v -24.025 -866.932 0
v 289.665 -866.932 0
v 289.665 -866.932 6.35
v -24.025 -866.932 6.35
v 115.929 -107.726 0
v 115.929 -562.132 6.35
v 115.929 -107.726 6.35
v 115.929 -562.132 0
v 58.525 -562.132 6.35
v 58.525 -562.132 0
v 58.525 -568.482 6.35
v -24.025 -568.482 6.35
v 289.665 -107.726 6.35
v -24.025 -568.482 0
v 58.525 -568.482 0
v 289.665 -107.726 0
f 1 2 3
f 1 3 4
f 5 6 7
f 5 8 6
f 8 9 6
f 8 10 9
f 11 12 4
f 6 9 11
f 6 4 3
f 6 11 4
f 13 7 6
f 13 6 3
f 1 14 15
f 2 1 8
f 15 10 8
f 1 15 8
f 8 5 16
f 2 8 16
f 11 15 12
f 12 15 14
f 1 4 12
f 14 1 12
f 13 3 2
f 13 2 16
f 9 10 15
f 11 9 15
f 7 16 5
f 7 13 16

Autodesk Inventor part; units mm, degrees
ref_plane "YZ Plane" through (0, 0, 0) normal (1, 0, 0) x (0, 1, 0)
ref_plane "XZ Plane" through (0, 0, 0) normal (0, 1, 0) x (-1, 0, 0)
ref_plane "XY Plane" through (0, 0, 0) normal (0, 0, 1) x (1, 0, 0)
sketch "Sketch1" plane through (0, 0, 0) normal (0, 0, 1) x (1, 0, 0)
  line L0 (-30.3746, 22.0684) -> (296.0154, 22.0684)
  line L1 (296.0154, 22.0684) -> (296.0154, -866.9316)
  line L2 (296.0154, -866.9316) -> (-30.3746, -866.9316)
  line L3 (-30.3746, -866.9316) -> (-30.3746, 22.0684)
  point P0 (0, 0)
  dimension "d0" = 326.39
  dimension "d1" = 889
extrude "Extrusion1" add sketch "Sketch1" along normal blind 6.35
sketch "Sketch2" plane through (0, 0, 6.35) normal (0, 0, 1) x (1, 0, 0)
  line L0 (296.0154, 22.0684) -> (296.0154, -866.9316) projected
  line L1 (296.0154, 22.0684) -> (289.6654, 22.0684)
  line L2 (289.6654, 22.0684) -> (289.6654, -28.7316)
  line L3 (289.6654, -28.7316) -> (296.0154, -28.7316)
  line L4 (296.0154, -28.7316) -> (296.0154, 22.0684)
  line L5 (289.6654, -28.7316) -> (296.0154, -28.7316)
  line L6 (296.0154, -28.7316) -> (296.0154, -79.5316)
  line L7 (296.0154, -79.5316) -> (289.6654, -79.5316)
  line L8 (289.6654, -79.5316) -> (289.6654, -28.7316)
  line L9 (289.6654, -79.5316) -> (296.0154, -79.5316)
  line L10 (296.0154, -79.5316) -> (296.0154, -130.3316)
  line L11 (296.0154, -130.3316) -> (289.6654, -130.3316)
  line L12 (289.6654, -130.3316) -> (289.6654, -79.5316)
  line L13 (289.6654, -130.3316) -> (296.0154, -130.3316)
  line L14 (296.0154, -130.3316) -> (296.0154, -181.1316)
  line L15 (296.0154, -181.1316) -> (289.6654, -181.1316)
  line L16 (289.6654, -181.1316) -> (289.6654, -130.3316)
  line L17 (289.6654, -181.1316) -> (296.0154, -181.1316)
  line L18 (296.0154, -181.1316) -> (296.0154, -231.9316)
  line L19 (296.0154, -231.9316) -> (289.6654, -231.9316)
  line L20 (289.6654, -231.9316) -> (289.6654, -181.1316)
  line L21 (289.6654, -231.9316) -> (296.0154, -231.9316)
  line L22 (296.0154, -231.9316) -> (296.0154, -282.7316)
  line L23 (296.0154, -282.7316) -> (289.6654, -282.7316)
  line L24 (289.6654, -282.7316) -> (289.6654, -231.9316)
  line L25 (289.6654, -282.7316) -> (296.0154, -282.7316)
  line L26 (296.0154, -282.7316) -> (296.0154, -333.5316)
  line L27 (296.0154, -333.5316) -> (289.6654, -333.5316)
  line L28 (289.6654, -333.5316) -> (289.6654, -282.7316)
  line L29 (289.6654, -333.5316) -> (296.0154, -333.5316)
  line L30 (296.0154, -333.5316) -> (296.0154, -384.3316)
  line L31 (296.0154, -384.3316) -> (289.6654, -384.3316)
  line L32 (289.6654, -384.3316) -> (289.6654, -333.5316)
  line L33 (289.6654, -384.3316) -> (296.0154, -384.3316)
  line L34 (296.0154, -384.3316) -> (296.0154, -435.1316)
  line L35 (296.0154, -435.1316) -> (289.6654, -435.1316)
  line L36 (289.6654, -435.1316) -> (289.6654, -384.3316)
  line L37 (289.6654, -435.1316) -> (296.0154, -435.1316)
  line L38 (296.0154, -435.1316) -> (296.0154, -485.9316)
  line L39 (296.0154, -485.9316) -> (289.6654, -485.9316)
  line L40 (289.6654, -485.9316) -> (289.6654, -435.1316)
  line L41 (289.6654, -485.9316) -> (296.0154, -485.9316)
  line L42 (296.0154, -485.9316) -> (296.0154, -536.7316)
  line L43 (296.0154, -536.7316) -> (289.6654, -536.7316)
  line L44 (289.6654, -536.7316) -> (289.6654, -485.9316)
  line L45 (289.6654, -536.7316) -> (296.0154, -536.7316)
  line L46 (296.0154, -536.7316) -> (296.0154, -587.5316)
  line L47 (296.0154, -587.5316) -> (289.6654, -587.5316)
  line L48 (289.6654, -587.5316) -> (289.6654, -536.7316)
  line L49 (289.6654, -587.5316) -> (296.0154, -587.5316)
  line L50 (296.0154, -587.5316) -> (296.0154, -638.3316)
  line L51 (296.0154, -638.3316) -> (289.6654, -638.3316)
  line L52 (289.6654, -638.3316) -> (289.6654, -587.5316)
  line L53 (289.6654, -638.3316) -> (296.0154, -638.3316)
  line L54 (296.0154, -638.3316) -> (296.0154, -689.1316)
  line L55 (296.0154, -689.1316) -> (289.6654, -689.1316)
  line L56 (289.6654, -689.1316) -> (289.6654, -638.3316)
  line L57 (289.6654, -689.1316) -> (296.0154, -689.1316)
  line L58 (296.0154, -689.1316) -> (296.0154, -739.9316)
  line L59 (296.0154, -739.9316) -> (289.6654, -739.9316)
  line L60 (289.6654, -739.9316) -> (289.6654, -689.1316)
  line L61 (289.6654, -739.9316) -> (296.0154, -739.9316)
  line L62 (296.0154, -739.9316) -> (296.0154, -790.7316)
  line L63 (296.0154, -790.7316) -> (289.6654, -790.7316)
  line L64 (289.6654, -790.7316) -> (289.6654, -739.9316)
  line L65 (289.6654, -790.7316) -> (296.0154, -790.7316)
  line L66 (296.0154, -790.7316) -> (296.0154, -841.5316)
  line L67 (296.0154, -841.5316) -> (289.6654, -841.5316)
  line L68 (289.6654, -841.5316) -> (289.6654, -790.7316)
  line L69 (289.6654, -841.5316) -> (296.0154, -841.5316)
  line L70 (296.0154, -841.5316) -> (296.0154, -866.9316)
  line L71 (296.0154, -866.9316) -> (289.6654, -866.9316)
  line L72 (289.6654, -866.9316) -> (289.6654, -841.5316)
  point P0 (0, 0)
  dimension "d4" = 6.35
  dimension "d5" = 50.8
  dimension "d6" = 50.8
  dimension "d7" = 50.8
  dimension "d8" = 50.8
  dimension "d9" = 50.8
  dimension "d10" = 50.8
  dimension "d11" = 50.8
  dimension "d12" = 50.8
  dimension "d13" = 50.8
  dimension "d14" = 50.8
  dimension "d15" = 50.8
  dimension "d16" = 50.8
  dimension "d17" = 50.8
  dimension "d18" = 50.8
  dimension "d19" = 50.8
  dimension "d20" = 50.8
  dimension "d21" = 50.8
extrude "Extrusion2" cut sketch "Sketch2" against normal blind 6.35 contours L0 L3 L2 L1 | L0 L11 L12 L7 | L0 L19 L20 L15 | L0 L27 L28 L23 | L0 L35 L36 L31 | L0 L43 L44 L39 | L0 L51 L52 L47 | L0 L59 L60 L55 | L0 L67 L68 L63 | L0 L71 L72 L67
sketch "Sketch3" plane through (0, 0, 6.35) normal (0, 0, 1) x (1, 0, 0)
  line L0 (-30.3746, -866.9316) -> (-30.3746, 22.0684) projected
  line L1 (289.6654, -866.9316) -> (-30.3746, -866.9316) projected
  line L2 (-30.3746, 22.0684) -> (-24.0246, 22.0684)
  line L3 (-24.0246, 22.0684) -> (-24.0246, -28.7316)
  line L4 (-24.0246, -28.7316) -> (-30.3746, -28.7316)
  line L5 (-30.3746, -28.7316) -> (-30.3746, 22.0684)
  line L6 (-30.3746, -28.7316) -> (-24.0246, -28.7316)
  line L7 (-24.0246, -28.7316) -> (-24.0246, -79.5316)
  line L8 (-24.0246, -79.5316) -> (-30.3746, -79.5316)
  line L9 (-30.3746, -79.5316) -> (-30.3746, -28.7316)
  line L10 (-24.0246, -79.5316) -> (-30.3746, -79.5316)
  line L11 (-30.3746, -79.5316) -> (-30.3746, -130.3316)
  line L12 (-30.3746, -130.3316) -> (-24.0246, -130.3316)
  line L13 (-24.0246, -130.3316) -> (-24.0246, -79.5316)
  line L14 (-24.0246, -130.3316) -> (-30.3746, -130.3316)
  line L15 (-30.3746, -130.3316) -> (-30.3746, -181.1316)
  line L16 (-30.3746, -181.1316) -> (-24.0246, -181.1316)
  line L17 (-24.0246, -181.1316) -> (-24.0246, -130.3316)
  line L18 (-30.3746, -181.1316) -> (-24.0246, -181.1316)
  line L19 (-24.0246, -181.1316) -> (-24.0246, -231.9316)
  line L20 (-24.0246, -231.9316) -> (-30.3746, -231.9316)
  line L21 (-30.3746, -231.9316) -> (-30.3746, -181.1316)
  line L22 (-24.0246, -231.9316) -> (-30.3746, -231.9316)
  line L23 (-30.3746, -231.9316) -> (-30.3746, -282.7316)
  line L24 (-30.3746, -282.7316) -> (-24.0246, -282.7316)
  line L25 (-24.0246, -282.7316) -> (-24.0246, -231.9316)
  line L26 (-30.3746, -282.7316) -> (-24.0246, -282.7316)
  line L27 (-24.0246, -282.7316) -> (-24.0246, -333.5316)
  line L28 (-24.0246, -333.5316) -> (-30.3746, -333.5316)
  line L29 (-30.3746, -333.5316) -> (-30.3746, -282.7316)
  line L30 (-24.0246, -333.5316) -> (-30.3746, -333.5316)
  line L31 (-30.3746, -333.5316) -> (-30.3746, -384.3316)
  line L32 (-30.3746, -384.3316) -> (-24.0246, -384.3316)
  line L33 (-24.0246, -384.3316) -> (-24.0246, -333.5316)
  line L34 (-30.3746, -384.3316) -> (-24.0246, -384.3316)
  line L35 (-24.0246, -384.3316) -> (-24.0246, -435.1316)
  line L36 (-24.0246, -435.1316) -> (-30.3746, -435.1316)
  line L37 (-30.3746, -435.1316) -> (-30.3746, -384.3316)
  line L38 (-24.0246, -435.1316) -> (-30.3746, -435.1316)
  line L39 (-30.3746, -435.1316) -> (-30.3746, -485.9316)
  line L40 (-30.3746, -485.9316) -> (-24.0246, -485.9316)
  line L41 (-24.0246, -485.9316) -> (-24.0246, -435.1316)
  line L42 (-30.3746, -485.9316) -> (-24.0246, -485.9316)
  line L43 (-24.0246, -485.9316) -> (-24.0246, -536.7316)
  line L44 (-24.0246, -536.7316) -> (-30.3746, -536.7316)
  line L45 (-30.3746, -536.7316) -> (-30.3746, -485.9316)
  line L46 (-24.0246, -536.7316) -> (-30.3746, -536.7316)
  line L47 (-30.3746, -536.7316) -> (-30.3746, -587.5316)
  line L48 (-30.3746, -587.5316) -> (-24.0246, -587.5316)
  line L49 (-24.0246, -587.5316) -> (-24.0246, -536.7316)
  line L50 (-30.3746, -587.5316) -> (-24.0246, -587.5316)
  line L51 (-24.0246, -587.5316) -> (-24.0246, -638.3316)
  line L52 (-24.0246, -638.3316) -> (-30.3746, -638.3316)
  line L53 (-30.3746, -638.3316) -> (-30.3746, -587.5316)
  line L54 (-24.0246, -638.3316) -> (-30.3746, -638.3316)
  line L55 (-30.3746, -638.3316) -> (-30.3746, -689.1316)
  line L56 (-30.3746, -689.1316) -> (-24.0246, -689.1316)
  line L57 (-24.0246, -689.1316) -> (-24.0246, -638.3316)
  line L58 (-30.3746, -689.1316) -> (-24.0246, -689.1316)
  line L59 (-24.0246, -689.1316) -> (-24.0246, -739.9316)
  line L60 (-24.0246, -739.9316) -> (-30.3746, -739.9316)
  line L61 (-30.3746, -739.9316) -> (-30.3746, -689.1316)
  line L62 (-30.3746, -739.9316) -> (-24.0246, -739.9316)
  line L63 (-24.0246, -739.9316) -> (-24.0246, -790.7316)
  line L64 (-24.0246, -790.7316) -> (-30.3746, -790.7316)
  line L65 (-30.3746, -790.7316) -> (-30.3746, -739.9316)
  line L66 (-30.3746, -790.7316) -> (-24.0246, -790.7316)
  line L67 (-24.0246, -790.7316) -> (-24.0246, -866.9316)
  line L68 (-24.0246, -866.9316) -> (-30.3746, -866.9316)
  line L69 (-30.3746, -866.9316) -> (-30.3746, -790.7316)
  point P0 (0, 0)
  dimension "d24" = 6.35
extrude "Extrusion3" cut sketch "Sketch3" against normal blind 6.35 contours L0 L64 L67 L1 | L0 L56 L59 L60 | L0 L48 L51 L52 | L0 L40 L43 L44 | L0 L32 L35 L36 | L0 L24 L27 L28 | L0 L16 L19 L20 | L0 L8 L13 L12 | L0 L2 L3 L4
sketch "Sketch4" plane through (0, 0, 6.35) normal (0, 0, 1) x (1, 0, 0)
  line L0 (-24.0246, 22.0684) -> (132.8204, 22.0684)
  line L1 (132.8204, 22.0684) -> (132.8204, 15.7184)
  line L2 (132.8204, 15.7184) -> (-24.0246, 15.7184)
  line L3 (-24.0246, 15.7184) -> (-24.0246, 22.0684)
  line L4 (132.8204, 22.0684) -> (158.2204, 22.0684)
  line L5 (158.2204, 22.0684) -> (158.2204, 15.7184)
  line L6 (158.2204, 15.7184) -> (132.8204, 15.7184)
  line L7 (132.8204, 15.7184) -> (132.8204, 22.0684)
  line L8 (158.2204, 22.0684) -> (209.0204, 22.0684)
  line L9 (209.0204, 22.0684) -> (209.0204, 15.7184)
  line L10 (209.0204, 15.7184) -> (158.2204, 15.7184)
  line L11 (158.2204, 15.7184) -> (158.2204, 22.0684)
  line L12 (209.0204, 22.0684) -> (259.8204, 22.0684)
  line L13 (259.8204, 22.0684) -> (259.8204, 15.7184)
  line L14 (259.8204, 15.7184) -> (209.0204, 15.7184)
  line L15 (209.0204, 15.7184) -> (209.0204, 22.0684)
  line L16 (132.8204, 22.0684) -> (107.4204, 22.0684)
  line L17 (107.4204, 22.0684) -> (107.4204, 15.7184)
  line L18 (107.4204, 15.7184) -> (132.8204, 15.7184)
  line L19 (132.8204, 15.7184) -> (132.8204, 22.0684)
  line L20 (107.4204, 22.0684) -> (56.6204, 22.0684)
  line L21 (56.6204, 22.0684) -> (56.6204, 15.7184)
  line L22 (56.6204, 15.7184) -> (107.4204, 15.7184)
  line L23 (107.4204, 15.7184) -> (107.4204, 22.0684)
  line L24 (56.6204, 22.0684) -> (5.8204, 22.0684)
  line L25 (5.8204, 22.0684) -> (5.8204, 15.7184)
  line L26 (5.8204, 15.7184) -> (56.6204, 15.7184)
  line L27 (56.6204, 15.7184) -> (56.6204, 22.0684)
  point P0 (0, 0)
  dimension "d27" = 156.845
  dimension "d28" = 6.35
  dimension "d29" = 25.4
  dimension "d30" = 50.8
  dimension "d31" = 50.8
  dimension "d32" = 25.4
  dimension "d33" = 50.8
  dimension "d34" = 50.8
extrude "Extrusion4" add sketch "Sketch4" along normal blind 6.35 contours L0 L21 L2 L25 | L0 L1 L2 L17 | L4 L5 L6 L1 | L12 L13 L14 L9
sketch "Sketch5" plane through (0, 0, 12.7) normal (0, 0, 1) x (1, 0, 0)
  line L0 (5.8204, 15.7184) -> (5.8204, 22.0684) projected
  line L1 (56.6204, 15.7184) -> (5.8204, 15.7184) projected
  line L2 (56.6204, 22.0684) -> (56.6204, 15.7184) projected
  line L3 (5.8204, 22.0684) -> (56.6204, 22.0684) projected
  point P0 (0, 0)
extrude "Extrusion5" cut sketch "Sketch5" against normal blind 25.4
sketch "Sketch6" plane through (0, 0, 12.7) normal (0, 0, 1) x (1, 0, 0)
  line L0 (107.4204, 22.0684) -> (158.2204, 22.0684) projected
  line L1 (107.4204, 15.7184) -> (107.4204, 22.0684) projected
  line L2 (158.2204, 15.7184) -> (107.4204, 15.7184) projected
  line L3 (158.2204, 22.0684) -> (158.2204, 15.7184) projected
  point P0 (0, 0)
extrude "Extrusion6" cut sketch "Sketch6" against normal blind 25.4
sketch "Sketch7" plane through (0, 0, 12.7) normal (0, 0, 1) x (1, 0, 0)
  line L0 (209.0204, 22.0684) -> (259.8204, 22.0684) projected
  line L1 (209.0204, 15.7184) -> (209.0204, 22.0684) projected
  line L2 (259.8204, 15.7184) -> (209.0204, 15.7184) projected
  line L3 (259.8204, 22.0684) -> (259.8204, 15.7184) projected
  point P0 (0, 0)
extrude "Extrusion7" cut sketch "Sketch7" against normal blind 25.4
sketch "Sketch8" plane through (0, 0, 6.35) normal (0, 0, 1) x (1, 0, 0)
  line L0 (289.6654, -866.9316) -> (-24.0246, -866.9316) projected
  line L1 (-24.0246, -866.9316) -> (5.8204, -866.9316)
  line L2 (5.8204, -866.9316) -> (5.8204, -860.5816)
  line L3 (5.8204, -860.5816) -> (-24.0246, -860.5816)
  line L4 (-24.0246, -860.5816) -> (-24.0246, -866.9316)
  line L5 (5.8204, -860.5816) -> (56.6204, -860.5816)
  line L6 (56.6204, -860.5816) -> (56.6204, -866.9316)
  line L7 (56.6204, -866.9316) -> (5.8204, -866.9316)
  line L8 (5.8204, -866.9316) -> (5.8204, -860.5816)
  line L9 (56.6204, -860.5816) -> (107.4204, -860.5816)
  line L10 (107.4204, -860.5816) -> (107.4204, -866.9316)
  line L11 (107.4204, -866.9316) -> (56.6204, -866.9316)
  line L12 (56.6204, -866.9316) -> (56.6204, -860.5816)
  line L13 (107.4204, -860.5816) -> (158.2204, -860.5816)
  line L14 (158.2204, -860.5816) -> (158.2204, -866.9316)
  line L15 (158.2204, -866.9316) -> (107.4204, -866.9316)
  line L16 (107.4204, -866.9316) -> (107.4204, -860.5816)
  line L17 (158.2204, -860.5816) -> (209.0204, -860.5816)
  line L18 (209.0204, -860.5816) -> (209.0204, -866.9316)
  line L19 (209.0204, -866.9316) -> (158.2204, -866.9316)
  line L20 (158.2204, -866.9316) -> (158.2204, -860.5816)
  line L21 (209.0204, -860.5816) -> (259.8204, -860.5816)
  line L22 (259.8204, -860.5816) -> (259.8204, -866.9316)
  line L23 (259.8204, -866.9316) -> (209.0204, -866.9316)
  line L24 (209.0204, -866.9316) -> (209.0204, -860.5816)
  point P0 (0, 0)
  dimension "d43" = 6.35
extrude "Extrusion8" cut sketch "Sketch8" against normal blind 25.4 contours L0 L18 L21 L22 | L0 L10 L13 L14 | L0 L2 L5 L6
sketch "Sketch9" plane through (0, 0, 0) normal (0, 0, -1) x (-1, 0, 0)
  line L0 (-289.6654, -866.9316) -> (-276.9654, -866.9316)
  line L1 (-276.9654, -866.9316) -> (-276.9654, -822.4816)
  line L2 (-276.9654, -822.4816) -> (-289.6654, -822.4816)
  line L3 (-289.6654, -822.4816) -> (-289.6654, -866.9316)
  line L4 (24.0246, -866.9316) -> (11.3246, -866.9316)
  line L5 (11.3246, -866.9316) -> (11.3246, -822.4816)
  line L6 (11.3246, -822.4816) -> (24.0246, -822.4816)
  line L7 (24.0246, -822.4816) -> (24.0246, -866.9316)
  circle A0 centre (-276.9654, -822.4816) radius 1.9812
  circle A1 centre (11.3246, -822.4816) radius 1.9812
  point P0 (0, 0)
  dimension "d46" = 12.7
  dimension "d47" = 44.45
  dimension "d48" = 12.7
  dimension "d49" = 44.45
  dimension "d50" = 3.9624
  dimension "d51" = 3.9624
extrude "Extrusion9" cut sketch "Sketch9" against normal blind 25.4 contours A0 L2 L1 | L1 L2 A0 | A1 L6 L5 | L5 L6 A1
sketch "Sketch10" plane through (0, 0, 0) normal (0, 0, -1) x (-1, 0, 0)
  circle A0 centre (-276.9654, -822.4816) radius 1.9812 projected
  point P0 (0, 0)
extrude "Extrusion10" add sketch "Sketch10" against normal blind 6.35
sketch "Sketch11" plane through (0, 0, 0) normal (0, 0, -1) x (-1, 0, 0)
  circle A0 centre (11.3246, -822.4816) radius 1.9812 projected
  point P0 (0, 0)
extrude "Extrusion11" add sketch "Sketch11" against normal blind 6.35
sketch "Sketch12" plane through (0, 0, 0) normal (0, 0, -1) x (-1, 0, 0)
  line L0 (-56.6204, -866.9316) -> (-56.6204, -860.5816) projected
  line L1 (-56.6204, -860.5816) -> (-5.8204, -860.5816) projected
  line L2 (-5.8204, -860.5816) -> (-5.8204, -866.9316) projected
  line L3 (-5.8204, -866.9316) -> (24.0246, -866.9316) projected
  line L4 (24.0246, -866.9316) -> (24.0246, -790.7316) projected
  line L5 (24.0246, -790.7316) -> (30.3746, -790.7316) projected
  line L6 (30.3746, -790.7316) -> (30.3746, -739.9316) projected
  line L7 (30.3746, -739.9316) -> (24.0246, -739.9316) projected
  line L8 (24.0246, -739.9316) -> (24.0246, -689.1316) projected
  line L9 (24.0246, -689.1316) -> (30.3746, -689.1316) projected
  line L10 (30.3746, -689.1316) -> (30.3746, -638.3316) projected
  line L11 (30.3746, -638.3316) -> (24.0246, -638.3316) projected
  line L12 (24.0246, -638.3316) -> (24.0246, -587.5316) projected
  line L13 (24.0246, -587.5316) -> (30.3746, -587.5316) projected
  line L14 (30.3746, -587.5316) -> (30.3746, -536.7316) projected
  line L15 (30.3746, -536.7316) -> (24.0246, -536.7316) projected
  line L16 (24.0246, -536.7316) -> (24.0246, -485.9316) projected
  line L17 (24.0246, -485.9316) -> (30.3746, -485.9316) projected
  line L18 (30.3746, -485.9316) -> (30.3746, -435.1316) projected
  line L19 (30.3746, -435.1316) -> (24.0246, -435.1316) projected
  line L20 (24.0246, -435.1316) -> (24.0246, -384.3316) projected
  line L21 (24.0246, -384.3316) -> (30.3746, -384.3316) projected
  line L22 (30.3746, -384.3316) -> (30.3746, -333.5316) projected
  line L23 (30.3746, -333.5316) -> (24.0246, -333.5316) projected
  line L24 (24.0246, -333.5316) -> (24.0246, -282.7316) projected
  line L25 (24.0246, -282.7316) -> (30.3746, -282.7316) projected
  line L26 (30.3746, -282.7316) -> (30.3746, -231.9316) projected
  line L27 (30.3746, -231.9316) -> (24.0246, -231.9316) projected
  line L28 (24.0246, -231.9316) -> (24.0246, -181.1316) projected
  line L29 (24.0246, -181.1316) -> (30.3746, -181.1316) projected
  line L30 (30.3746, -181.1316) -> (30.3746, -130.3316) projected
  line L31 (30.3746, -130.3316) -> (24.0246, -130.3316) projected
  line L32 (24.0246, -130.3316) -> (24.0246, -79.5316) projected
  line L33 (24.0246, -79.5316) -> (30.3746, -79.5316) projected
  line L34 (30.3746, -79.5316) -> (30.3746, -28.7316) projected
  line L35 (30.3746, -28.7316) -> (24.0246, -28.7316) projected
  line L36 (24.0246, -28.7316) -> (24.0246, 22.0684) projected
  line L37 (24.0246, 22.0684) -> (-5.8204, 22.0684) projected
  line L38 (-5.8204, 22.0684) -> (-5.8204, 15.7184) projected
  line L39 (-5.8204, 15.7184) -> (-56.6204, 15.7184) projected
  line L40 (-56.6204, 15.7184) -> (-56.6204, 22.0684) projected
  line L41 (-56.6204, 22.0684) -> (-107.4204, 22.0684) projected
  line L42 (-107.4204, 22.0684) -> (-107.4204, 15.7184) projected
  line L43 (-107.4204, 15.7184) -> (-158.2204, 15.7184) projected
  line L44 (-158.2204, 15.7184) -> (-158.2204, 22.0684) projected
  line L45 (-158.2204, 22.0684) -> (-209.0204, 22.0684) projected
  line L46 (-209.0204, 22.0684) -> (-209.0204, 15.7184) projected
  line L47 (-209.0204, 15.7184) -> (-259.8204, 15.7184) projected
  line L48 (-259.8204, 15.7184) -> (-259.8204, 22.0684) projected
  line L49 (-259.8204, 22.0684) -> (-289.6654, 22.0684) projected
  line L50 (-289.6654, 22.0684) -> (-289.6654, -28.7316) projected
  line L51 (-289.6654, -28.7316) -> (-296.0154, -28.7316) projected
  line L52 (-296.0154, -28.7316) -> (-296.0154, -79.5316) projected
  line L53 (-296.0154, -79.5316) -> (-289.6654, -79.5316) projected
  line L54 (-289.6654, -79.5316) -> (-289.6654, -130.3316) projected
  line L55 (-289.6654, -130.3316) -> (-296.0154, -130.3316) projected
  line L56 (-296.0154, -130.3316) -> (-296.0154, -181.1316) projected
  line L57 (-296.0154, -181.1316) -> (-289.6654, -181.1316) projected
  line L58 (-289.6654, -181.1316) -> (-289.6654, -231.9316) projected
  line L59 (-289.6654, -231.9316) -> (-296.0154, -231.9316) projected
  line L60 (-296.0154, -231.9316) -> (-296.0154, -282.7316) projected
  line L61 (-296.0154, -282.7316) -> (-289.6654, -282.7316) projected
  line L62 (-289.6654, -282.7316) -> (-289.6654, -333.5316) projected
  line L63 (-289.6654, -333.5316) -> (-296.0154, -333.5316) projected
  line L64 (-296.0154, -333.5316) -> (-296.0154, -384.3316) projected
  line L65 (-296.0154, -384.3316) -> (-289.6654, -384.3316) projected
  line L66 (-289.6654, -384.3316) -> (-289.6654, -435.1316) projected
  line L67 (-289.6654, -435.1316) -> (-296.0154, -435.1316) projected
  line L68 (-296.0154, -435.1316) -> (-296.0154, -485.9316) projected
  line L69 (-296.0154, -485.9316) -> (-289.6654, -485.9316) projected
  line L70 (-289.6654, -485.9316) -> (-289.6654, -536.7316) projected
  line L71 (-289.6654, -536.7316) -> (-296.0154, -536.7316) projected
  line L72 (-296.0154, -536.7316) -> (-296.0154, -587.5316) projected
  line L73 (-296.0154, -587.5316) -> (-289.6654, -587.5316) projected
  line L74 (-289.6654, -587.5316) -> (-289.6654, -638.3316) projected
  line L75 (-289.6654, -638.3316) -> (-296.0154, -638.3316) projected
  line L76 (-296.0154, -638.3316) -> (-296.0154, -689.1316) projected
  line L77 (-296.0154, -689.1316) -> (-289.6654, -689.1316) projected
  line L78 (-289.6654, -689.1316) -> (-289.6654, -739.9316) projected
  line L79 (-289.6654, -739.9316) -> (-296.0154, -739.9316) projected
  line L80 (-296.0154, -739.9316) -> (-296.0154, -790.7316) projected
  line L81 (-296.0154, -790.7316) -> (-289.6654, -790.7316) projected
  line L82 (-289.6654, -790.7316) -> (-289.6654, -866.9316) projected
  line L83 (-289.6654, -866.9316) -> (-259.8204, -866.9316) projected
  line L84 (-259.8204, -866.9316) -> (-259.8204, -860.5816) projected
  line L85 (-259.8204, -860.5816) -> (-209.0204, -860.5816) projected
  line L86 (-209.0204, -860.5816) -> (-209.0204, -866.9316) projected
  line L87 (-209.0204, -866.9316) -> (-158.2204, -866.9316) projected
  line L88 (-158.2204, -866.9316) -> (-158.2204, -860.5816) projected
  line L89 (-158.2204, -860.5816) -> (-107.4204, -860.5816) projected
  line L90 (-107.4204, -860.5816) -> (-107.4204, -866.9316) projected
  line L91 (-107.4204, -866.9316) -> (-56.6204, -866.9316) projected
  point P0 (0, 0)
sketch "Sketch13" plane through (0, 0, 0) normal (0, 0, -1) x (-1, 0, 0)
  line L0 (-289.6654, -866.9316) -> (-283.3154, -866.9316)
  line L1 (-283.3154, -866.9316) -> (-283.3154, -822.4816)
  line L2 (-283.3154, -822.4816) -> (-289.6654, -822.4816)
  line L3 (-289.6654, -822.4816) -> (-289.6654, -866.9316)
  line L4 (24.0246, -866.9316) -> (17.6746, -866.9316)
  line L5 (17.6746, -866.9316) -> (17.6746, -822.4816)
  line L6 (17.6746, -822.4816) -> (24.0246, -822.4816)
  line L7 (24.0246, -822.4816) -> (24.0246, -866.9316)
  circle A0 centre (-283.3154, -822.4816) radius 1.9812
  circle A1 centre (17.6746, -822.4816) radius 1.9812
  point P0 (0, 0)
  dimension "d58" = 6.35
  dimension "d59" = 44.45
  dimension "d60" = 6.35
  dimension "d61" = 3.9624
  dimension "d62" = 3.9624
extrude "Extrusion12" cut sketch "Sketch13" against normal blind 6.35 contours A0 L2 L1 | L1 L2 A0 | A1 L6 L5 | L5 L6 A1
sketch "Sketch14" plane through (0, 0, 0) normal (0, 0, -1) x (-1, 0, 0)
  line L0 (30.3746, -689.1316) -> (30.3746, -638.3316) projected
  line L1 (24.0246, -638.3316) -> (24.0246, -587.5316) projected
  line L2 (-289.6654, -587.5316) -> (-289.6654, -638.3316) projected
  line L3 (-289.6654, -638.3316) -> (-289.6654, -631.9816)
  line L4 (-289.6654, -631.9816) -> (-264.2654, -631.9816)
  line L5 (-264.2654, -631.9816) -> (-1.3754, -631.9816)
  line L6 (-1.3754, -631.9816) -> (-1.3754, -625.6316)
  line L7 (-1.3754, -625.6316) -> (-264.2654, -625.6316)
  line L8 (-264.2654, -625.6316) -> (-264.2654, -631.9816)
  point P0 (0, 0)
  dimension "d65" = 6.35
  dimension "d66" = 25.4
  dimension "d67" = 262.89
  dimension "d68" = 6.35
extrude "Extrusion13" cut sketch "Sketch14" against normal blind 25.4
sketch "Sketch15" plane through (0, 0, 0) normal (0, 0, -1) x (-1, 0, 0)
  line L0 (-1.3754, -625.6316) -> (-1.3754, -631.9816) projected
  line L1 (-1.3754, -631.9816) -> (-264.2654, -631.9816) projected
  line L2 (-264.2654, -631.9816) -> (-264.2654, -625.6316) projected
  line L3 (-264.2654, -625.6316) -> (-1.3754, -625.6316) projected
  point P0 (0, 0)
extrude "Extrusion14" add sketch "Sketch15" against normal blind 6.35
sketch "Sketch16" plane through (0, 0, 0) normal (0, 0, -1) x (-1, 0, 0)
  line L0 (-56.6204, -866.9316) -> (-56.6204, -860.5816) projected
  line L1 (-56.6204, -860.5816) -> (-5.8204, -860.5816) projected
  line L2 (-5.8204, -860.5816) -> (-5.8204, -866.9316) projected
  line L3 (-5.8204, -866.9316) -> (24.0246, -866.9316) projected
  line L4 (24.0246, -866.9316) -> (24.0246, -790.7316) projected
  line L5 (24.0246, -790.7316) -> (30.3746, -790.7316) projected
  line L6 (30.3746, -790.7316) -> (30.3746, -739.9316) projected
  line L7 (30.3746, -739.9316) -> (24.0246, -739.9316) projected
  line L8 (24.0246, -739.9316) -> (24.0246, -689.1316) projected
  line L9 (24.0246, -689.1316) -> (30.3746, -689.1316) projected
  line L10 (30.3746, -689.1316) -> (30.3746, -638.3316) projected
  line L11 (30.3746, -638.3316) -> (24.0246, -638.3316) projected
  line L12 (24.0246, -638.3316) -> (24.0246, -587.5316) projected
  line L13 (24.0246, -587.5316) -> (30.3746, -587.5316) projected
  line L14 (30.3746, -587.5316) -> (30.3746, -536.7316) projected
  line L15 (30.3746, -536.7316) -> (24.0246, -536.7316) projected
  line L16 (24.0246, -536.7316) -> (24.0246, -485.9316) projected
  line L17 (24.0246, -485.9316) -> (30.3746, -485.9316) projected
  line L18 (30.3746, -485.9316) -> (30.3746, -435.1316) projected
  line L19 (30.3746, -435.1316) -> (24.0246, -435.1316) projected
  line L20 (24.0246, -435.1316) -> (24.0246, -384.3316) projected
  line L21 (24.0246, -384.3316) -> (30.3746, -384.3316) projected
  line L22 (30.3746, -384.3316) -> (30.3746, -333.5316) projected
  line L23 (30.3746, -333.5316) -> (24.0246, -333.5316) projected
  line L24 (24.0246, -333.5316) -> (24.0246, -282.7316) projected
  line L25 (24.0246, -282.7316) -> (30.3746, -282.7316) projected
  line L26 (30.3746, -282.7316) -> (30.3746, -231.9316) projected
  line L27 (30.3746, -231.9316) -> (24.0246, -231.9316) projected
  line L28 (24.0246, -231.9316) -> (24.0246, -181.1316) projected
  line L29 (24.0246, -181.1316) -> (30.3746, -181.1316) projected
  line L30 (30.3746, -181.1316) -> (30.3746, -130.3316) projected
  line L31 (30.3746, -130.3316) -> (24.0246, -130.3316) projected
  line L32 (24.0246, -130.3316) -> (24.0246, -79.5316) projected
  line L33 (24.0246, -79.5316) -> (30.3746, -79.5316) projected
  line L34 (30.3746, -79.5316) -> (30.3746, -28.7316) projected
  line L35 (30.3746, -28.7316) -> (24.0246, -28.7316) projected
  line L36 (24.0246, -28.7316) -> (24.0246, 22.0684) projected
  line L37 (24.0246, 22.0684) -> (-5.8204, 22.0684) projected
  line L38 (-5.8204, 22.0684) -> (-5.8204, 15.7184) projected
  line L39 (-5.8204, 15.7184) -> (-56.6204, 15.7184) projected
  line L40 (-56.6204, 15.7184) -> (-56.6204, 22.0684) projected
  line L41 (-56.6204, 22.0684) -> (-107.4204, 22.0684) projected
  line L42 (-107.4204, 22.0684) -> (-107.4204, 15.7184) projected
  line L43 (-107.4204, 15.7184) -> (-158.2204, 15.7184) projected
  line L44 (-158.2204, 15.7184) -> (-158.2204, 22.0684) projected
  line L45 (-158.2204, 22.0684) -> (-209.0204, 22.0684) projected
  line L46 (-209.0204, 22.0684) -> (-209.0204, 15.7184) projected
  line L47 (-209.0204, 15.7184) -> (-259.8204, 15.7184) projected
  line L48 (-259.8204, 15.7184) -> (-259.8204, 22.0684) projected
  line L49 (-259.8204, 22.0684) -> (-289.6654, 22.0684) projected
  line L50 (-289.6654, 22.0684) -> (-289.6654, -28.7316) projected
  line L51 (-289.6654, -28.7316) -> (-296.0154, -28.7316) projected
  line L52 (-296.0154, -28.7316) -> (-296.0154, -79.5316) projected
  line L53 (-296.0154, -79.5316) -> (-289.6654, -79.5316) projected
  line L54 (-289.6654, -79.5316) -> (-289.6654, -130.3316) projected
  line L55 (-289.6654, -130.3316) -> (-296.0154, -130.3316) projected
  line L56 (-296.0154, -130.3316) -> (-296.0154, -181.1316) projected
  line L57 (-296.0154, -181.1316) -> (-289.6654, -181.1316) projected
  line L58 (-289.6654, -181.1316) -> (-289.6654, -231.9316) projected
  line L59 (-289.6654, -231.9316) -> (-296.0154, -231.9316) projected
  line L60 (-296.0154, -231.9316) -> (-296.0154, -282.7316) projected
  line L61 (-296.0154, -282.7316) -> (-289.6654, -282.7316) projected
  line L62 (-289.6654, -282.7316) -> (-289.6654, -333.5316) projected
  line L63 (-289.6654, -333.5316) -> (-296.0154, -333.5316) projected
  line L64 (-296.0154, -333.5316) -> (-296.0154, -384.3316) projected
  line L65 (-296.0154, -384.3316) -> (-289.6654, -384.3316) projected
  line L66 (-289.6654, -384.3316) -> (-289.6654, -435.1316) projected
  line L67 (-289.6654, -435.1316) -> (-296.0154, -435.1316) projected
  line L68 (-296.0154, -435.1316) -> (-296.0154, -485.9316) projected
  line L69 (-296.0154, -485.9316) -> (-289.6654, -485.9316) projected
  line L70 (-289.6654, -485.9316) -> (-289.6654, -536.7316) projected
  line L71 (-289.6654, -536.7316) -> (-296.0154, -536.7316) projected
  line L72 (-296.0154, -536.7316) -> (-296.0154, -587.5316) projected
  line L73 (-296.0154, -587.5316) -> (-289.6654, -587.5316) projected
  line L74 (-289.6654, -587.5316) -> (-289.6654, -638.3316) projected
  line L75 (-289.6654, -638.3316) -> (-296.0154, -638.3316) projected
  line L76 (-296.0154, -638.3316) -> (-296.0154, -689.1316) projected
  line L77 (-296.0154, -689.1316) -> (-289.6654, -689.1316) projected
  line L78 (-289.6654, -689.1316) -> (-289.6654, -739.9316) projected
  line L79 (-289.6654, -739.9316) -> (-296.0154, -739.9316) projected
  line L80 (-296.0154, -739.9316) -> (-296.0154, -790.7316) projected
  line L81 (-296.0154, -790.7316) -> (-289.6654, -790.7316) projected
  line L82 (-289.6654, -790.7316) -> (-289.6654, -866.9316) projected
  line L83 (-289.6654, -866.9316) -> (-259.8204, -866.9316) projected
  line L84 (-259.8204, -866.9316) -> (-259.8204, -860.5816) projected
  line L85 (-259.8204, -860.5816) -> (-209.0204, -860.5816) projected
  line L86 (-209.0204, -860.5816) -> (-209.0204, -866.9316) projected
  line L87 (-209.0204, -866.9316) -> (-158.2204, -866.9316) projected
  line L88 (-158.2204, -866.9316) -> (-158.2204, -860.5816) projected
  line L89 (-158.2204, -860.5816) -> (-107.4204, -860.5816) projected
  line L90 (-107.4204, -860.5816) -> (-107.4204, -866.9316) projected
  line L91 (-107.4204, -866.9316) -> (-56.6204, -866.9316) projected
  line L92 (-289.6654, -28.7316) -> (-289.6654, -790.7316)
  point P0 (0, 0)
extrude "Extrusion15" cut sketch "Sketch16" against normal blind 25.4 contours L81 L80 L79 L92 | L77 L76 L75 L92 | L73 L72 L71 L92 | L69 L68 L67 L92 | L65 L64 L63 L92 | L61 L60 L59 L92 | L57 L56 L55 L92 | L53 L52 L51 L92
sketch "Sketch17" plane through (0, 0, 0) normal (0, 0, -1) x (-1, 0, 0)
  line L0 (-289.6654, 22.0684) -> (-289.6654, -866.9316) projected
  line L1 (-289.6654, -866.9316) -> (-259.8204, -866.9316) projected
  line L2 (-259.8204, -866.9316) -> (-259.8204, -860.5816) projected
  line L3 (-259.8204, -860.5816) -> (-209.0204, -860.5816) projected
  line L4 (-209.0204, -860.5816) -> (-209.0204, -866.9316) projected
  line L5 (-209.0204, -866.9316) -> (-158.2204, -866.9316) projected
  line L6 (-158.2204, -866.9316) -> (-158.2204, -860.5816) projected
  line L7 (-158.2204, -860.5816) -> (-107.4204, -860.5816) projected
  line L8 (-107.4204, -860.5816) -> (-107.4204, -866.9316) projected
  line L9 (-107.4204, -866.9316) -> (-56.6204, -866.9316) projected
  line L10 (-56.6204, -866.9316) -> (-56.6204, -860.5816) projected
  line L11 (-56.6204, -860.5816) -> (-5.8204, -860.5816) projected
  line L12 (-5.8204, -860.5816) -> (-5.8204, -866.9316) projected
  line L13 (-5.8204, -866.9316) -> (24.0246, -866.9316) projected
  line L14 (24.0246, -866.9316) -> (24.0246, -790.7316) projected
  line L15 (24.0246, -790.7316) -> (30.3746, -790.7316) projected
  line L16 (30.3746, -790.7316) -> (30.3746, -739.9316) projected
  line L17 (30.3746, -739.9316) -> (24.0246, -739.9316) projected
  line L18 (24.0246, -739.9316) -> (24.0246, -689.1316) projected
  line L19 (24.0246, -689.1316) -> (30.3746, -689.1316) projected
  line L20 (30.3746, -689.1316) -> (30.3746, -638.3316) projected
  line L21 (30.3746, -638.3316) -> (24.0246, -638.3316) projected
  line L22 (24.0246, -638.3316) -> (24.0246, -587.5316) projected
  line L23 (24.0246, -587.5316) -> (30.3746, -587.5316) projected
  line L24 (30.3746, -587.5316) -> (30.3746, -536.7316) projected
  line L25 (30.3746, -536.7316) -> (24.0246, -536.7316) projected
  line L26 (24.0246, -536.7316) -> (24.0246, -485.9316) projected
  line L27 (24.0246, -485.9316) -> (30.3746, -485.9316) projected
  line L28 (30.3746, -485.9316) -> (30.3746, -435.1316) projected
  line L29 (30.3746, -435.1316) -> (24.0246, -435.1316) projected
  line L30 (24.0246, -435.1316) -> (24.0246, -384.3316) projected
  line L31 (24.0246, -384.3316) -> (30.3746, -384.3316) projected
  line L32 (30.3746, -384.3316) -> (30.3746, -333.5316) projected
  line L33 (30.3746, -333.5316) -> (24.0246, -333.5316) projected
  line L34 (24.0246, -333.5316) -> (24.0246, -282.7316) projected
  line L35 (24.0246, -282.7316) -> (30.3746, -282.7316) projected
  line L36 (30.3746, -282.7316) -> (30.3746, -231.9316) projected
  line L37 (30.3746, -231.9316) -> (24.0246, -231.9316) projected
  line L38 (24.0246, -231.9316) -> (24.0246, -181.1316) projected
  line L39 (24.0246, -181.1316) -> (30.3746, -181.1316) projected
  line L40 (30.3746, -181.1316) -> (30.3746, -130.3316) projected
  line L41 (30.3746, -130.3316) -> (24.0246, -130.3316) projected
  line L42 (24.0246, -130.3316) -> (24.0246, -79.5316) projected
  line L43 (24.0246, -79.5316) -> (30.3746, -79.5316) projected
  line L44 (30.3746, -79.5316) -> (30.3746, -28.7316) projected
  line L45 (30.3746, -28.7316) -> (24.0246, -28.7316) projected
  line L46 (24.0246, -28.7316) -> (24.0246, 22.0684) projected
  line L47 (24.0246, 22.0684) -> (-5.8204, 22.0684) projected
  line L48 (-5.8204, 22.0684) -> (-5.8204, 15.7184) projected
  line L49 (-5.8204, 15.7184) -> (-56.6204, 15.7184) projected
  line L50 (-56.6204, 15.7184) -> (-56.6204, 22.0684) projected
  line L51 (-56.6204, 22.0684) -> (-107.4204, 22.0684) projected
  line L52 (-107.4204, 22.0684) -> (-107.4204, 15.7184) projected
  line L53 (-107.4204, 15.7184) -> (-158.2204, 15.7184) projected
  line L54 (-158.2204, 15.7184) -> (-158.2204, 22.0684) projected
  line L55 (-158.2204, 22.0684) -> (-209.0204, 22.0684) projected
  line L56 (-209.0204, 22.0684) -> (-209.0204, 15.7184) projected
  line L57 (-209.0204, 15.7184) -> (-259.8204, 15.7184) projected
  line L58 (-259.8204, 15.7184) -> (-259.8204, 22.0684) projected
  line L59 (-259.8204, 22.0684) -> (-289.6654, 22.0684) projected
  line L60 (-289.6654, 15.7184) -> (24.0246, 15.7184)
  point P0 (0, 0)
extrude "Extrusion16" cut sketch "Sketch17" against normal blind 25.4 contours L59 L58 L60 L0 | L56 L55 L54 L60 | L52 L51 L50 L60 | L48 L47 L46 L60
sketch "Sketch18" plane through (0, 0, 0) normal (0, 0, -1) x (-1, 0, 0)
  line L0 (24.0246, 15.7184) -> (-289.6654, 15.7184) projected
  line L1 (-289.6654, 15.7184) -> (-289.6654, -866.9316) projected
  line L2 (-289.6654, -866.9316) -> (-259.8204, -866.9316) projected
  line L3 (-259.8204, -866.9316) -> (-259.8204, -860.5816) projected
  line L4 (-259.8204, -860.5816) -> (-209.0204, -860.5816) projected
  line L5 (-209.0204, -860.5816) -> (-209.0204, -866.9316) projected
  line L6 (-209.0204, -866.9316) -> (-158.2204, -866.9316) projected
  line L7 (-158.2204, -866.9316) -> (-158.2204, -860.5816) projected
  line L8 (-158.2204, -860.5816) -> (-107.4204, -860.5816) projected
  line L9 (-107.4204, -860.5816) -> (-107.4204, -866.9316) projected
  line L10 (-107.4204, -866.9316) -> (-56.6204, -866.9316) projected
  line L11 (-56.6204, -866.9316) -> (-56.6204, -860.5816) projected
  line L12 (-56.6204, -860.5816) -> (-5.8204, -860.5816) projected
  line L13 (-5.8204, -860.5816) -> (-5.8204, -866.9316) projected
  line L14 (-5.8204, -866.9316) -> (24.0246, -866.9316) projected
  line L15 (24.0246, -866.9316) -> (24.0246, -790.7316) projected
  line L16 (24.0246, -790.7316) -> (30.3746, -790.7316) projected
  line L17 (30.3746, -790.7316) -> (30.3746, -739.9316) projected
  line L18 (30.3746, -739.9316) -> (24.0246, -739.9316) projected
  line L19 (24.0246, -739.9316) -> (24.0246, -689.1316) projected
  line L20 (24.0246, -689.1316) -> (30.3746, -689.1316) projected
  line L21 (30.3746, -689.1316) -> (30.3746, -638.3316) projected
  line L22 (30.3746, -638.3316) -> (24.0246, -638.3316) projected
  line L23 (24.0246, -638.3316) -> (24.0246, -587.5316) projected
  line L24 (24.0246, -587.5316) -> (30.3746, -587.5316) projected
  line L25 (30.3746, -587.5316) -> (30.3746, -536.7316) projected
  line L26 (30.3746, -536.7316) -> (24.0246, -536.7316) projected
  line L27 (24.0246, -536.7316) -> (24.0246, -485.9316) projected
  line L28 (24.0246, -485.9316) -> (30.3746, -485.9316) projected
  line L29 (30.3746, -485.9316) -> (30.3746, -435.1316) projected
  line L30 (30.3746, -435.1316) -> (24.0246, -435.1316) projected
  line L31 (24.0246, -435.1316) -> (24.0246, -384.3316) projected
  line L32 (24.0246, -384.3316) -> (30.3746, -384.3316) projected
  line L33 (30.3746, -384.3316) -> (30.3746, -333.5316) projected
  line L34 (30.3746, -333.5316) -> (24.0246, -333.5316) projected
  line L35 (24.0246, -333.5316) -> (24.0246, -282.7316) projected
  line L36 (24.0246, -282.7316) -> (30.3746, -282.7316) projected
  line L37 (30.3746, -282.7316) -> (30.3746, -231.9316) projected
  line L38 (30.3746, -231.9316) -> (24.0246, -231.9316) projected
  line L39 (24.0246, -231.9316) -> (24.0246, -181.1316) projected
  line L40 (24.0246, -181.1316) -> (30.3746, -181.1316) projected
  line L41 (30.3746, -181.1316) -> (30.3746, -130.3316) projected
  line L42 (30.3746, -130.3316) -> (24.0246, -130.3316) projected
  line L43 (24.0246, -130.3316) -> (24.0246, -79.5316) projected
  line L44 (24.0246, -79.5316) -> (30.3746, -79.5316) projected
  line L45 (30.3746, -79.5316) -> (30.3746, -28.7316) projected
  line L46 (30.3746, -28.7316) -> (24.0246, -28.7316) projected
  line L47 (24.0246, -28.7316) -> (24.0246, 15.7184) projected
  line L48 (24.0246, -28.7316) -> (24.0246, -790.7316)
  point P0 (0, 0)
extrude "Extrusion17" cut sketch "Sketch18" against normal blind 25.4 contours L46 L45 L44 L48 | L42 L41 L40 L48 | L38 L37 L36 L48 | L34 L33 L32 L48 | L30 L29 L28 L48 | L26 L25 L24 L48 | L22 L21 L20 L48 | L18 L17 L16 L48
sketch "Sketch19" plane through (0, 0, 0) normal (0, 0, -1) x (-1, 0, 0)
  line L0 (24.0246, -866.9316) -> (24.0246, 15.7184) projected
  line L1 (24.0246, 15.7184) -> (-289.6654, 15.7184) projected
  line L2 (-289.6654, 15.7184) -> (-289.6654, -866.9316) projected
  line L3 (-289.6654, -866.9316) -> (-259.8204, -866.9316) projected
  line L4 (-259.8204, -866.9316) -> (-259.8204, -860.5816) projected
  line L5 (-259.8204, -860.5816) -> (-209.0204, -860.5816) projected
  line L6 (-209.0204, -860.5816) -> (-209.0204, -866.9316) projected
  line L7 (-209.0204, -866.9316) -> (-158.2204, -866.9316) projected
  line L8 (-158.2204, -866.9316) -> (-158.2204, -860.5816) projected
  line L9 (-158.2204, -860.5816) -> (-107.4204, -860.5816) projected
  line L10 (-107.4204, -860.5816) -> (-107.4204, -866.9316) projected
  line L11 (-107.4204, -866.9316) -> (-56.6204, -866.9316) projected
  line L12 (-56.6204, -866.9316) -> (-56.6204, -860.5816) projected
  line L13 (-56.6204, -860.5816) -> (-5.8204, -860.5816) projected
  line L14 (-5.8204, -860.5816) -> (-5.8204, -866.9316) projected
  line L15 (-5.8204, -866.9316) -> (24.0246, -866.9316) projected
  line L16 (-259.8204, -866.9316) -> (-5.8204, -866.9316)
  point P0 (0, 0)
extrude "Extrusion18" add sketch "Sketch19" against normal blind 6.35 contours L16 L12 L13 L14 | L16 L8 L9 L10 | L4 L5 L6 L16
sketch "Sketch20" plane through (0, 0, 0) normal (0, 0, -1) x (-1, 0, 0)
  circle A0 centre (17.6746, -822.4816) radius 1.9812 projected
  circle A1 centre (-283.3154, -822.4816) radius 1.9812 projected
  point P0 (0, 0)
extrude "Extrusion19" add sketch "Sketch20" against normal blind 6.35
sketch "Sketch21" plane through (0, 0, 0) normal (0, 0, -1) x (-1, 0, 0)
  line L0 (24.0246, -866.9316) -> (24.0246, 15.7184) projected
  line L1 (24.0246, -866.9316) -> (24.0246, -555.7816)
  line L2 (24.0246, -555.7816) -> (-122.0254, -555.7816)
  line L3 (-122.0254, -555.7816) -> (-122.0254, -166.5437)
  line L4 (-122.0254, -166.5437) -> (24.0246, -166.5437)
  point P0 (0, 0)
  dimension "d83" = 311.15
  dimension "d84" = 146.05
extrude "Extrusion20" cut sketch "Sketch21" against normal blind 25.4
sketch "Sketch22" plane through (0, 0, 0) normal (0, 0, -1) x (-1, 0, 0)
  line L0 (24.0246, -166.5437) -> (24.0246, 15.7184) projected
  line L1 (24.0246, 15.7184) -> (-289.6654, 15.7184) projected
  line L2 (-289.6654, 15.7184) -> (-289.6654, -866.9316) projected
  line L3 (-289.6654, -866.9316) -> (-289.6654, -75.9756)
  line L4 (-289.6654, -75.9756) -> (-289.6654, -82.3256)
  line L5 (-289.6654, -82.3256) -> (24.0246, -82.3256)
  point P0 (0, 0)
  dimension "d87" = 790.956
  dimension "d88" = 6.35
extrude "Extrusion21" cut sketch "Sketch22" against normal blind 25.4
sketch "Sketch23" plane through (0, 0, 0) normal (0, 0, -1) x (-1, 0, 0)
  line L0 (24.0246, -82.3256) -> (-289.6654, -82.3256) projected
  line L1 (-122.0254, -166.5437) -> (24.0246, -166.5437) projected
  line L2 (24.0246, -166.5437) -> (24.0246, -82.3256) projected
  line L3 (-122.0254, -166.5437) -> (-122.0254, -82.3256)
  point P0 (0, 0)
extrude "Extrusion22" cut sketch "Sketch23" against normal blind 25.4
sketch "Sketch24" plane through (0, 0, 6.35) normal (0, 0, 1) x (1, 0, 0)
  line L0 (-24.0246, -555.7816) -> (122.0254, -555.7816)
  line L1 (122.0254, -555.7816) -> (122.0254, -562.1316)
  line L2 (122.0254, -562.1316) -> (-24.0246, -562.1316)
  line L3 (-24.0246, -562.1316) -> (-24.0246, -555.7816)
  point P0 (0, 0)
  dimension "d93" = 6.35
extrude "Extrusion23" cut sketch "Sketch24" against normal blind 25.4
sketch "Sketch25" plane through (0, 0, 6.35) normal (0, 0, 1) x (1, 0, 0)
  line L0 (122.0254, -82.3256) -> (122.0254, -562.1316) projected
  line L1 (-24.0246, -562.1316) -> (122.0254, -562.1316)
  line L2 (122.0254, -562.1316) -> (122.0254, -555.7816)
  line L3 (122.0254, -555.7816) -> (-24.0246, -555.7816)
  line L4 (-24.0246, -555.7816) -> (-24.0246, -562.1316)
  line L5 (122.0254, -555.7816) -> (115.9294, -555.7816)
  line L6 (115.9294, -555.7816) -> (115.9294, -82.3256)
  line L7 (115.9294, -82.3256) -> (122.0254, -82.3256)
  line L8 (122.0254, -82.3256) -> (122.0254, -555.7816)
  point P0 (0, 0)
  dimension "d96" = 6.35
  dimension "d97" = 6.096
extrude "Extrusion24" add sketch "Sketch25" against normal blind 6.35
sketch "Sketch26" plane through (0, 0, 0) normal (0, 0, -1) x (-1, 0, 0)
  line L0 (24.0246, -866.9316) -> (24.0246, -555.7816) projected
  line L1 (-115.9294, -555.7816) -> (24.0246, -555.7816)
  line L2 (24.0246, -555.7816) -> (24.0246, -562.1316)
  line L3 (24.0246, -562.1316) -> (-115.9294, -562.1316)
  line L4 (-115.9294, -562.1316) -> (-115.9294, -555.7816)
  point P0 (0, 0)
  dimension "d100" = 6.35
extrude "Extrusion25" cut sketch "Sketch26" against normal blind 6.35
sketch "Sketch27" plane through (0, 0, 0) normal (0, 0, -1) x (-1, 0, 0)
  line L0 (-115.9294, -562.1316) -> (-115.9294, -82.3256) projected
  line L1 (-289.6654, -82.3256) -> (-115.9294, -82.3256)
  line L2 (-115.9294, -82.3256) -> (-115.9294, -88.6756)
  line L3 (-115.9294, -88.6756) -> (-289.6654, -88.6756)
  line L4 (-289.6654, -88.6756) -> (-289.6654, -82.3256)
  point P0 (0, 0)
  dimension "d103" = 6.35
extrude "Extrusion26" cut sketch "Sketch27" against normal blind 6.35
sketch "Sketch28" plane through (0, 0, 6.35) normal (0, 0, 1) x (1, 0, 0)
  line L0 (115.9294, -562.1316) -> (-24.0246, -562.1316)
  line L1 (-24.0246, -562.1316) -> (-24.0246, -555.7816)
  line L2 (-24.0246, -555.7816) -> (115.9294, -555.7816)
  line L3 (115.9294, -555.7816) -> (115.9294, -562.1316)
  point P0 (0, 0)
  dimension "d106" = 6.35
extrude "Extrusion27" add sketch "Sketch28" against normal blind 6.35
sketch "Sketch29" plane through (0, 0, 0) normal (0, 0, -1) x (-1, 0, 0)
  line L0 (24.0246, -555.7816) -> (24.0246, -866.9316) projected
  line L1 (-115.9294, -555.7816) -> (24.0246, -555.7816)
  line L2 (24.0246, -555.7816) -> (24.0246, -562.1316)
  line L3 (24.0246, -562.1316) -> (-115.9294, -562.1316)
  line L4 (-115.9294, -562.1316) -> (-115.9294, -555.7816)
  point P0 (0, 0)
  dimension "d109" = 6.35
extrude "Extrusion28" cut sketch "Sketch29" against normal blind 25.4
sketch "Sketch30" plane through (0, 0, 0) normal (0, 0, -1) x (-1, 0, 0)
  line L0 (24.0246, -562.1316) -> (-58.5254, -562.1316)
  line L1 (-58.5254, -562.1316) -> (-58.5254, -568.4816)
  line L2 (-58.5254, -568.4816) -> (24.0246, -568.4816)
  line L3 (24.0246, -568.4816) -> (24.0246, -562.1316)
  point P0 (0, 0)
  dimension "d112" = 82.55
  dimension "d113" = 6.35
extrude "Extrusion29" cut sketch "Sketch30" against normal blind 25.4
sketch "Sketch31" plane through (0, 0, 6.35) normal (0, 0, 1) x (1, 0, 0)
  line L0 (289.6654, -866.9316) -> (289.6654, -88.6756) projected
  line L1 (115.9294, -88.6756) -> (289.6654, -88.6756)
  line L2 (289.6654, -88.6756) -> (289.6654, -107.7256)
  line L3 (289.6654, -107.7256) -> (115.9294, -107.7256)
  line L4 (115.9294, -107.7256) -> (115.9294, -88.6756)
  point P0 (0, 0)
  dimension "d116" = 19.05
extrude "Extrusion30" cut sketch "Sketch31" against normal blind 25.4
properties part number "it side"
